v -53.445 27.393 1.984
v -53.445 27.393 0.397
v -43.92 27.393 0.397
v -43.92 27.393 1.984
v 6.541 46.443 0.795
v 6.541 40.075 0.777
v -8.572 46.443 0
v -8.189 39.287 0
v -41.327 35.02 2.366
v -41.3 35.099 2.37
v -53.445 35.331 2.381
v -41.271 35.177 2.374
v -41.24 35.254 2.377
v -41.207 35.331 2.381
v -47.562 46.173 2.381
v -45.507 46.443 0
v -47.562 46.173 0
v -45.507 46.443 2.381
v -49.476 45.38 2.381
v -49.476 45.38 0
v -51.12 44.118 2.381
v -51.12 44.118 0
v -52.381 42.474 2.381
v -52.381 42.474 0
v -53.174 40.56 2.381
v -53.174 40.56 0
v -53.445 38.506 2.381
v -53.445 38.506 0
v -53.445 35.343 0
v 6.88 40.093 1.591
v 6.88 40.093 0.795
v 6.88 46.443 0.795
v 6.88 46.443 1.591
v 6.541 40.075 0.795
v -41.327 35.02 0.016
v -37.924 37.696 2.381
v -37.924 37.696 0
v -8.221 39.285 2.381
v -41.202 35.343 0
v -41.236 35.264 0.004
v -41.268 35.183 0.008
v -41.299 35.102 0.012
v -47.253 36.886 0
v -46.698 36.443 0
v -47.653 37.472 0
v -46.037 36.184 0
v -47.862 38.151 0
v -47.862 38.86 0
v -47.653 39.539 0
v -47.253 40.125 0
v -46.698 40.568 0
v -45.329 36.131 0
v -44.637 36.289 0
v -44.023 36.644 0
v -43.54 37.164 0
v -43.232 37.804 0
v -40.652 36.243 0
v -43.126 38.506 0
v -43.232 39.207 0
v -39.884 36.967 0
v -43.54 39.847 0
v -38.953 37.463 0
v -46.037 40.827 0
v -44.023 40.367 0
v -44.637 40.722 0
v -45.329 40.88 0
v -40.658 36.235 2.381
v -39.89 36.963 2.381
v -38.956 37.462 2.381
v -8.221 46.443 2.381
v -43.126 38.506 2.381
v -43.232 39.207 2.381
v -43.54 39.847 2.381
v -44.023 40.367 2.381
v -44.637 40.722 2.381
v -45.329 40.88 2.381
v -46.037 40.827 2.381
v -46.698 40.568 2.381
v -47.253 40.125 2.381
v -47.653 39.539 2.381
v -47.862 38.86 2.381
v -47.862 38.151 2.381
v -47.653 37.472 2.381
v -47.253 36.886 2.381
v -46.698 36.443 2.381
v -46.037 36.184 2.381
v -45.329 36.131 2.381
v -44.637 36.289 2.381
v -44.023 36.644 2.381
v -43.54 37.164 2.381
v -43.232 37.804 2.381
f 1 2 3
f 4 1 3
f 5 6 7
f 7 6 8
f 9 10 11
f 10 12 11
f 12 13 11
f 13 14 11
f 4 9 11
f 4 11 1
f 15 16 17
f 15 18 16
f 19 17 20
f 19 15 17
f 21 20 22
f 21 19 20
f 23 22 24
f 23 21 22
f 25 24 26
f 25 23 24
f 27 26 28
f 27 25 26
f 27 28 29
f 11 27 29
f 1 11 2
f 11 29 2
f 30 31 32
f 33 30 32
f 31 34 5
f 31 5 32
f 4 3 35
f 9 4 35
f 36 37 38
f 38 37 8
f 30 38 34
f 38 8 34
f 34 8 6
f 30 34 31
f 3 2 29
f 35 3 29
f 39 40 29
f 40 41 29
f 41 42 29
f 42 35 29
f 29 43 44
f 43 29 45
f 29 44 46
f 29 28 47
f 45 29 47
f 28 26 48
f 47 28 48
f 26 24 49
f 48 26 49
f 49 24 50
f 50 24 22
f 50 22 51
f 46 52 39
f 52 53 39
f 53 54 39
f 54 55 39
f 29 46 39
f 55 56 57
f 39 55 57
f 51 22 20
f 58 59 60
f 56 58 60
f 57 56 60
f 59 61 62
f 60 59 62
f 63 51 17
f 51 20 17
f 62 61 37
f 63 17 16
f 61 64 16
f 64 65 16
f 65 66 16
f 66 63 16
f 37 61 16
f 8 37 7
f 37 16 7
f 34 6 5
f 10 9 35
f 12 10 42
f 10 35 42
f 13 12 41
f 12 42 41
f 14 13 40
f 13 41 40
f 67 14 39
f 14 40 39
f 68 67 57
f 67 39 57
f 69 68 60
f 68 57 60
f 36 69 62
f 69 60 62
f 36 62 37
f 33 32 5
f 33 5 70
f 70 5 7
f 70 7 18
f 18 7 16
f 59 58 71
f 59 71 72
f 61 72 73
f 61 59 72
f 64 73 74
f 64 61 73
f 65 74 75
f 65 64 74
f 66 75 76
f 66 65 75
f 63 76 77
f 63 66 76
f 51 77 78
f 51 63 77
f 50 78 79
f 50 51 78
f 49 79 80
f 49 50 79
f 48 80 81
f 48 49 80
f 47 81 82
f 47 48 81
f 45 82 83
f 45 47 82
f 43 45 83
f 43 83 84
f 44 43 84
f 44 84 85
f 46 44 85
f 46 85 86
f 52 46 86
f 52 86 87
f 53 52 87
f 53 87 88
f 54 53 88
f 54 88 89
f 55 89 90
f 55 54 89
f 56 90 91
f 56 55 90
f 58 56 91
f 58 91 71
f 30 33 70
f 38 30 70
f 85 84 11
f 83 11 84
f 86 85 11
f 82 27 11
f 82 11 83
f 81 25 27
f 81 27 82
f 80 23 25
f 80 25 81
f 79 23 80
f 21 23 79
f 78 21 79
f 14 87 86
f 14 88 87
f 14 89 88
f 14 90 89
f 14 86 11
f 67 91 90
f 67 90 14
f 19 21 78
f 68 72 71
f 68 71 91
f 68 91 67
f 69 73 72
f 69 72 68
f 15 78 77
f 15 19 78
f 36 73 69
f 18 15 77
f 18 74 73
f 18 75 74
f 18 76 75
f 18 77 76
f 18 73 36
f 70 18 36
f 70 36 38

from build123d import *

# Parameters (mm, degrees)
F0_R      = 2.38125
F1_DEPTH  = 2.38125
F2_R      = 7.9375
F4_DEPTH  = 19.051
F6_DEPTH  = 9.5648146833
F8_DEPTH  = 19.051
F10_DEPTH = 60.326


with BuildPart() as f1:
    # F0 (on Top) → F1 (new body)
    with BuildSketch(Plane.XY):
        with BuildLine():
            Line((6.8802531183, 46.4430405467), (-53.4447468817, 46.4430405467))
            Line((-53.4447468817, 46.4430405467), (-53.4447468817, 27.3930405467))
            Line((-53.4447468817, 27.3930405467), (-43.9197468817, 27.3930405467))
            Line((-43.9197468817, 27.3930405467), (-41.3273820942, 35.0202070092))
            ThreePointArc((-41.3273820942, 35.0202070092), (-40.0228140496, 36.8628863815), (-37.9243791103, 37.6959145069))
            Line((-37.9243791103, 37.6959145069), (6.8802531183, 40.0930405467))
            Line((6.8802531183, 40.0930405467), (6.8802531183, 46.4430405467))
        make_face()
        with Locations((-45.5072468817, 38.5055405467)):
            Circle(F0_R, mode=Mode.SUBTRACT)
    extrude(amount=F1_DEPTH)

    # F2
    f2_edges = [f1.edges().sort_by_distance(p)[0] for p in [
        (-53.444747, 46.443041, 1.190625),
    ]]
    fillet(f2_edges, radius=F2_R)

    # F3 (on face) → F4 (cut, through all)
    with BuildSketch(Plane(origin=(0, 46.4430405467, 0), x_dir=(-1, 0, 0), z_dir=(0, 1, 0))):
        Polygon((-7.2697603085, 1.5504802494), (-6.8802531183, 1.5907407505), (8.2211783156, 2.38125), (8.2030607001, 2.727358446), (-7.2193359956, 3.1990723219), align=None)
    extrude(amount=-F4_DEPTH, mode=Mode.SUBTRACT)

    # F5 (on face) → F6 (cut, through all)
    with BuildSketch(Plane(origin=(-2.1192870449, 39.6115494375, 0), x_dir=(0.9985718469, 0.053425337, 0), z_dir=(0.053425337, -0.9985718469, 0))):
        Polygon((9.0124112666, 0.7953703753), (-6.0780490749, 0), (9.0124112666, 0), align=None)
    extrude(amount=-F6_DEPTH, mode=Mode.SUBTRACT)

    # F7 (on face) → F8 (cut, through all)
    with BuildSketch(Plane(origin=(0, 46.4430405467, 0), x_dir=(-1, 0, 0), z_dir=(0, 1, 0))):
        Polygon((-6.5405170331, 0.7953703753), (-6.8802531183, 0.7953703753), (-6.9836541079, 0.7953703753), (-6.9836541079, -0.0977396412), (-6.5405170331, -0.0977396412), align=None)
    extrude(amount=-F8_DEPTH, mode=Mode.SUBTRACT)

    # F9 (on face) → F10 (cut, through all)
    with BuildSketch(Plane(origin=(-53.4447468817, 0, 0), x_dir=(0, -1, 0), z_dir=(-1, 0, 0))):
        Polygon((-35.3305405467, 2.38125), (-27.3930405467, 1.984375), (-26.6849351877, 1.984375), (-26.7145372927, 2.7254258748), align=None)
        Polygon((-26.9428193569, 0.396875), (-27.3930405467, 0.396875), (-35.3432405467, 0), (-35.0132025778, -0.3093605337), (-26.8219634891, -0.3093605337), align=None)
    extrude(amount=-F10_DEPTH, mode=Mode.SUBTRACT)


solid = f1.part
